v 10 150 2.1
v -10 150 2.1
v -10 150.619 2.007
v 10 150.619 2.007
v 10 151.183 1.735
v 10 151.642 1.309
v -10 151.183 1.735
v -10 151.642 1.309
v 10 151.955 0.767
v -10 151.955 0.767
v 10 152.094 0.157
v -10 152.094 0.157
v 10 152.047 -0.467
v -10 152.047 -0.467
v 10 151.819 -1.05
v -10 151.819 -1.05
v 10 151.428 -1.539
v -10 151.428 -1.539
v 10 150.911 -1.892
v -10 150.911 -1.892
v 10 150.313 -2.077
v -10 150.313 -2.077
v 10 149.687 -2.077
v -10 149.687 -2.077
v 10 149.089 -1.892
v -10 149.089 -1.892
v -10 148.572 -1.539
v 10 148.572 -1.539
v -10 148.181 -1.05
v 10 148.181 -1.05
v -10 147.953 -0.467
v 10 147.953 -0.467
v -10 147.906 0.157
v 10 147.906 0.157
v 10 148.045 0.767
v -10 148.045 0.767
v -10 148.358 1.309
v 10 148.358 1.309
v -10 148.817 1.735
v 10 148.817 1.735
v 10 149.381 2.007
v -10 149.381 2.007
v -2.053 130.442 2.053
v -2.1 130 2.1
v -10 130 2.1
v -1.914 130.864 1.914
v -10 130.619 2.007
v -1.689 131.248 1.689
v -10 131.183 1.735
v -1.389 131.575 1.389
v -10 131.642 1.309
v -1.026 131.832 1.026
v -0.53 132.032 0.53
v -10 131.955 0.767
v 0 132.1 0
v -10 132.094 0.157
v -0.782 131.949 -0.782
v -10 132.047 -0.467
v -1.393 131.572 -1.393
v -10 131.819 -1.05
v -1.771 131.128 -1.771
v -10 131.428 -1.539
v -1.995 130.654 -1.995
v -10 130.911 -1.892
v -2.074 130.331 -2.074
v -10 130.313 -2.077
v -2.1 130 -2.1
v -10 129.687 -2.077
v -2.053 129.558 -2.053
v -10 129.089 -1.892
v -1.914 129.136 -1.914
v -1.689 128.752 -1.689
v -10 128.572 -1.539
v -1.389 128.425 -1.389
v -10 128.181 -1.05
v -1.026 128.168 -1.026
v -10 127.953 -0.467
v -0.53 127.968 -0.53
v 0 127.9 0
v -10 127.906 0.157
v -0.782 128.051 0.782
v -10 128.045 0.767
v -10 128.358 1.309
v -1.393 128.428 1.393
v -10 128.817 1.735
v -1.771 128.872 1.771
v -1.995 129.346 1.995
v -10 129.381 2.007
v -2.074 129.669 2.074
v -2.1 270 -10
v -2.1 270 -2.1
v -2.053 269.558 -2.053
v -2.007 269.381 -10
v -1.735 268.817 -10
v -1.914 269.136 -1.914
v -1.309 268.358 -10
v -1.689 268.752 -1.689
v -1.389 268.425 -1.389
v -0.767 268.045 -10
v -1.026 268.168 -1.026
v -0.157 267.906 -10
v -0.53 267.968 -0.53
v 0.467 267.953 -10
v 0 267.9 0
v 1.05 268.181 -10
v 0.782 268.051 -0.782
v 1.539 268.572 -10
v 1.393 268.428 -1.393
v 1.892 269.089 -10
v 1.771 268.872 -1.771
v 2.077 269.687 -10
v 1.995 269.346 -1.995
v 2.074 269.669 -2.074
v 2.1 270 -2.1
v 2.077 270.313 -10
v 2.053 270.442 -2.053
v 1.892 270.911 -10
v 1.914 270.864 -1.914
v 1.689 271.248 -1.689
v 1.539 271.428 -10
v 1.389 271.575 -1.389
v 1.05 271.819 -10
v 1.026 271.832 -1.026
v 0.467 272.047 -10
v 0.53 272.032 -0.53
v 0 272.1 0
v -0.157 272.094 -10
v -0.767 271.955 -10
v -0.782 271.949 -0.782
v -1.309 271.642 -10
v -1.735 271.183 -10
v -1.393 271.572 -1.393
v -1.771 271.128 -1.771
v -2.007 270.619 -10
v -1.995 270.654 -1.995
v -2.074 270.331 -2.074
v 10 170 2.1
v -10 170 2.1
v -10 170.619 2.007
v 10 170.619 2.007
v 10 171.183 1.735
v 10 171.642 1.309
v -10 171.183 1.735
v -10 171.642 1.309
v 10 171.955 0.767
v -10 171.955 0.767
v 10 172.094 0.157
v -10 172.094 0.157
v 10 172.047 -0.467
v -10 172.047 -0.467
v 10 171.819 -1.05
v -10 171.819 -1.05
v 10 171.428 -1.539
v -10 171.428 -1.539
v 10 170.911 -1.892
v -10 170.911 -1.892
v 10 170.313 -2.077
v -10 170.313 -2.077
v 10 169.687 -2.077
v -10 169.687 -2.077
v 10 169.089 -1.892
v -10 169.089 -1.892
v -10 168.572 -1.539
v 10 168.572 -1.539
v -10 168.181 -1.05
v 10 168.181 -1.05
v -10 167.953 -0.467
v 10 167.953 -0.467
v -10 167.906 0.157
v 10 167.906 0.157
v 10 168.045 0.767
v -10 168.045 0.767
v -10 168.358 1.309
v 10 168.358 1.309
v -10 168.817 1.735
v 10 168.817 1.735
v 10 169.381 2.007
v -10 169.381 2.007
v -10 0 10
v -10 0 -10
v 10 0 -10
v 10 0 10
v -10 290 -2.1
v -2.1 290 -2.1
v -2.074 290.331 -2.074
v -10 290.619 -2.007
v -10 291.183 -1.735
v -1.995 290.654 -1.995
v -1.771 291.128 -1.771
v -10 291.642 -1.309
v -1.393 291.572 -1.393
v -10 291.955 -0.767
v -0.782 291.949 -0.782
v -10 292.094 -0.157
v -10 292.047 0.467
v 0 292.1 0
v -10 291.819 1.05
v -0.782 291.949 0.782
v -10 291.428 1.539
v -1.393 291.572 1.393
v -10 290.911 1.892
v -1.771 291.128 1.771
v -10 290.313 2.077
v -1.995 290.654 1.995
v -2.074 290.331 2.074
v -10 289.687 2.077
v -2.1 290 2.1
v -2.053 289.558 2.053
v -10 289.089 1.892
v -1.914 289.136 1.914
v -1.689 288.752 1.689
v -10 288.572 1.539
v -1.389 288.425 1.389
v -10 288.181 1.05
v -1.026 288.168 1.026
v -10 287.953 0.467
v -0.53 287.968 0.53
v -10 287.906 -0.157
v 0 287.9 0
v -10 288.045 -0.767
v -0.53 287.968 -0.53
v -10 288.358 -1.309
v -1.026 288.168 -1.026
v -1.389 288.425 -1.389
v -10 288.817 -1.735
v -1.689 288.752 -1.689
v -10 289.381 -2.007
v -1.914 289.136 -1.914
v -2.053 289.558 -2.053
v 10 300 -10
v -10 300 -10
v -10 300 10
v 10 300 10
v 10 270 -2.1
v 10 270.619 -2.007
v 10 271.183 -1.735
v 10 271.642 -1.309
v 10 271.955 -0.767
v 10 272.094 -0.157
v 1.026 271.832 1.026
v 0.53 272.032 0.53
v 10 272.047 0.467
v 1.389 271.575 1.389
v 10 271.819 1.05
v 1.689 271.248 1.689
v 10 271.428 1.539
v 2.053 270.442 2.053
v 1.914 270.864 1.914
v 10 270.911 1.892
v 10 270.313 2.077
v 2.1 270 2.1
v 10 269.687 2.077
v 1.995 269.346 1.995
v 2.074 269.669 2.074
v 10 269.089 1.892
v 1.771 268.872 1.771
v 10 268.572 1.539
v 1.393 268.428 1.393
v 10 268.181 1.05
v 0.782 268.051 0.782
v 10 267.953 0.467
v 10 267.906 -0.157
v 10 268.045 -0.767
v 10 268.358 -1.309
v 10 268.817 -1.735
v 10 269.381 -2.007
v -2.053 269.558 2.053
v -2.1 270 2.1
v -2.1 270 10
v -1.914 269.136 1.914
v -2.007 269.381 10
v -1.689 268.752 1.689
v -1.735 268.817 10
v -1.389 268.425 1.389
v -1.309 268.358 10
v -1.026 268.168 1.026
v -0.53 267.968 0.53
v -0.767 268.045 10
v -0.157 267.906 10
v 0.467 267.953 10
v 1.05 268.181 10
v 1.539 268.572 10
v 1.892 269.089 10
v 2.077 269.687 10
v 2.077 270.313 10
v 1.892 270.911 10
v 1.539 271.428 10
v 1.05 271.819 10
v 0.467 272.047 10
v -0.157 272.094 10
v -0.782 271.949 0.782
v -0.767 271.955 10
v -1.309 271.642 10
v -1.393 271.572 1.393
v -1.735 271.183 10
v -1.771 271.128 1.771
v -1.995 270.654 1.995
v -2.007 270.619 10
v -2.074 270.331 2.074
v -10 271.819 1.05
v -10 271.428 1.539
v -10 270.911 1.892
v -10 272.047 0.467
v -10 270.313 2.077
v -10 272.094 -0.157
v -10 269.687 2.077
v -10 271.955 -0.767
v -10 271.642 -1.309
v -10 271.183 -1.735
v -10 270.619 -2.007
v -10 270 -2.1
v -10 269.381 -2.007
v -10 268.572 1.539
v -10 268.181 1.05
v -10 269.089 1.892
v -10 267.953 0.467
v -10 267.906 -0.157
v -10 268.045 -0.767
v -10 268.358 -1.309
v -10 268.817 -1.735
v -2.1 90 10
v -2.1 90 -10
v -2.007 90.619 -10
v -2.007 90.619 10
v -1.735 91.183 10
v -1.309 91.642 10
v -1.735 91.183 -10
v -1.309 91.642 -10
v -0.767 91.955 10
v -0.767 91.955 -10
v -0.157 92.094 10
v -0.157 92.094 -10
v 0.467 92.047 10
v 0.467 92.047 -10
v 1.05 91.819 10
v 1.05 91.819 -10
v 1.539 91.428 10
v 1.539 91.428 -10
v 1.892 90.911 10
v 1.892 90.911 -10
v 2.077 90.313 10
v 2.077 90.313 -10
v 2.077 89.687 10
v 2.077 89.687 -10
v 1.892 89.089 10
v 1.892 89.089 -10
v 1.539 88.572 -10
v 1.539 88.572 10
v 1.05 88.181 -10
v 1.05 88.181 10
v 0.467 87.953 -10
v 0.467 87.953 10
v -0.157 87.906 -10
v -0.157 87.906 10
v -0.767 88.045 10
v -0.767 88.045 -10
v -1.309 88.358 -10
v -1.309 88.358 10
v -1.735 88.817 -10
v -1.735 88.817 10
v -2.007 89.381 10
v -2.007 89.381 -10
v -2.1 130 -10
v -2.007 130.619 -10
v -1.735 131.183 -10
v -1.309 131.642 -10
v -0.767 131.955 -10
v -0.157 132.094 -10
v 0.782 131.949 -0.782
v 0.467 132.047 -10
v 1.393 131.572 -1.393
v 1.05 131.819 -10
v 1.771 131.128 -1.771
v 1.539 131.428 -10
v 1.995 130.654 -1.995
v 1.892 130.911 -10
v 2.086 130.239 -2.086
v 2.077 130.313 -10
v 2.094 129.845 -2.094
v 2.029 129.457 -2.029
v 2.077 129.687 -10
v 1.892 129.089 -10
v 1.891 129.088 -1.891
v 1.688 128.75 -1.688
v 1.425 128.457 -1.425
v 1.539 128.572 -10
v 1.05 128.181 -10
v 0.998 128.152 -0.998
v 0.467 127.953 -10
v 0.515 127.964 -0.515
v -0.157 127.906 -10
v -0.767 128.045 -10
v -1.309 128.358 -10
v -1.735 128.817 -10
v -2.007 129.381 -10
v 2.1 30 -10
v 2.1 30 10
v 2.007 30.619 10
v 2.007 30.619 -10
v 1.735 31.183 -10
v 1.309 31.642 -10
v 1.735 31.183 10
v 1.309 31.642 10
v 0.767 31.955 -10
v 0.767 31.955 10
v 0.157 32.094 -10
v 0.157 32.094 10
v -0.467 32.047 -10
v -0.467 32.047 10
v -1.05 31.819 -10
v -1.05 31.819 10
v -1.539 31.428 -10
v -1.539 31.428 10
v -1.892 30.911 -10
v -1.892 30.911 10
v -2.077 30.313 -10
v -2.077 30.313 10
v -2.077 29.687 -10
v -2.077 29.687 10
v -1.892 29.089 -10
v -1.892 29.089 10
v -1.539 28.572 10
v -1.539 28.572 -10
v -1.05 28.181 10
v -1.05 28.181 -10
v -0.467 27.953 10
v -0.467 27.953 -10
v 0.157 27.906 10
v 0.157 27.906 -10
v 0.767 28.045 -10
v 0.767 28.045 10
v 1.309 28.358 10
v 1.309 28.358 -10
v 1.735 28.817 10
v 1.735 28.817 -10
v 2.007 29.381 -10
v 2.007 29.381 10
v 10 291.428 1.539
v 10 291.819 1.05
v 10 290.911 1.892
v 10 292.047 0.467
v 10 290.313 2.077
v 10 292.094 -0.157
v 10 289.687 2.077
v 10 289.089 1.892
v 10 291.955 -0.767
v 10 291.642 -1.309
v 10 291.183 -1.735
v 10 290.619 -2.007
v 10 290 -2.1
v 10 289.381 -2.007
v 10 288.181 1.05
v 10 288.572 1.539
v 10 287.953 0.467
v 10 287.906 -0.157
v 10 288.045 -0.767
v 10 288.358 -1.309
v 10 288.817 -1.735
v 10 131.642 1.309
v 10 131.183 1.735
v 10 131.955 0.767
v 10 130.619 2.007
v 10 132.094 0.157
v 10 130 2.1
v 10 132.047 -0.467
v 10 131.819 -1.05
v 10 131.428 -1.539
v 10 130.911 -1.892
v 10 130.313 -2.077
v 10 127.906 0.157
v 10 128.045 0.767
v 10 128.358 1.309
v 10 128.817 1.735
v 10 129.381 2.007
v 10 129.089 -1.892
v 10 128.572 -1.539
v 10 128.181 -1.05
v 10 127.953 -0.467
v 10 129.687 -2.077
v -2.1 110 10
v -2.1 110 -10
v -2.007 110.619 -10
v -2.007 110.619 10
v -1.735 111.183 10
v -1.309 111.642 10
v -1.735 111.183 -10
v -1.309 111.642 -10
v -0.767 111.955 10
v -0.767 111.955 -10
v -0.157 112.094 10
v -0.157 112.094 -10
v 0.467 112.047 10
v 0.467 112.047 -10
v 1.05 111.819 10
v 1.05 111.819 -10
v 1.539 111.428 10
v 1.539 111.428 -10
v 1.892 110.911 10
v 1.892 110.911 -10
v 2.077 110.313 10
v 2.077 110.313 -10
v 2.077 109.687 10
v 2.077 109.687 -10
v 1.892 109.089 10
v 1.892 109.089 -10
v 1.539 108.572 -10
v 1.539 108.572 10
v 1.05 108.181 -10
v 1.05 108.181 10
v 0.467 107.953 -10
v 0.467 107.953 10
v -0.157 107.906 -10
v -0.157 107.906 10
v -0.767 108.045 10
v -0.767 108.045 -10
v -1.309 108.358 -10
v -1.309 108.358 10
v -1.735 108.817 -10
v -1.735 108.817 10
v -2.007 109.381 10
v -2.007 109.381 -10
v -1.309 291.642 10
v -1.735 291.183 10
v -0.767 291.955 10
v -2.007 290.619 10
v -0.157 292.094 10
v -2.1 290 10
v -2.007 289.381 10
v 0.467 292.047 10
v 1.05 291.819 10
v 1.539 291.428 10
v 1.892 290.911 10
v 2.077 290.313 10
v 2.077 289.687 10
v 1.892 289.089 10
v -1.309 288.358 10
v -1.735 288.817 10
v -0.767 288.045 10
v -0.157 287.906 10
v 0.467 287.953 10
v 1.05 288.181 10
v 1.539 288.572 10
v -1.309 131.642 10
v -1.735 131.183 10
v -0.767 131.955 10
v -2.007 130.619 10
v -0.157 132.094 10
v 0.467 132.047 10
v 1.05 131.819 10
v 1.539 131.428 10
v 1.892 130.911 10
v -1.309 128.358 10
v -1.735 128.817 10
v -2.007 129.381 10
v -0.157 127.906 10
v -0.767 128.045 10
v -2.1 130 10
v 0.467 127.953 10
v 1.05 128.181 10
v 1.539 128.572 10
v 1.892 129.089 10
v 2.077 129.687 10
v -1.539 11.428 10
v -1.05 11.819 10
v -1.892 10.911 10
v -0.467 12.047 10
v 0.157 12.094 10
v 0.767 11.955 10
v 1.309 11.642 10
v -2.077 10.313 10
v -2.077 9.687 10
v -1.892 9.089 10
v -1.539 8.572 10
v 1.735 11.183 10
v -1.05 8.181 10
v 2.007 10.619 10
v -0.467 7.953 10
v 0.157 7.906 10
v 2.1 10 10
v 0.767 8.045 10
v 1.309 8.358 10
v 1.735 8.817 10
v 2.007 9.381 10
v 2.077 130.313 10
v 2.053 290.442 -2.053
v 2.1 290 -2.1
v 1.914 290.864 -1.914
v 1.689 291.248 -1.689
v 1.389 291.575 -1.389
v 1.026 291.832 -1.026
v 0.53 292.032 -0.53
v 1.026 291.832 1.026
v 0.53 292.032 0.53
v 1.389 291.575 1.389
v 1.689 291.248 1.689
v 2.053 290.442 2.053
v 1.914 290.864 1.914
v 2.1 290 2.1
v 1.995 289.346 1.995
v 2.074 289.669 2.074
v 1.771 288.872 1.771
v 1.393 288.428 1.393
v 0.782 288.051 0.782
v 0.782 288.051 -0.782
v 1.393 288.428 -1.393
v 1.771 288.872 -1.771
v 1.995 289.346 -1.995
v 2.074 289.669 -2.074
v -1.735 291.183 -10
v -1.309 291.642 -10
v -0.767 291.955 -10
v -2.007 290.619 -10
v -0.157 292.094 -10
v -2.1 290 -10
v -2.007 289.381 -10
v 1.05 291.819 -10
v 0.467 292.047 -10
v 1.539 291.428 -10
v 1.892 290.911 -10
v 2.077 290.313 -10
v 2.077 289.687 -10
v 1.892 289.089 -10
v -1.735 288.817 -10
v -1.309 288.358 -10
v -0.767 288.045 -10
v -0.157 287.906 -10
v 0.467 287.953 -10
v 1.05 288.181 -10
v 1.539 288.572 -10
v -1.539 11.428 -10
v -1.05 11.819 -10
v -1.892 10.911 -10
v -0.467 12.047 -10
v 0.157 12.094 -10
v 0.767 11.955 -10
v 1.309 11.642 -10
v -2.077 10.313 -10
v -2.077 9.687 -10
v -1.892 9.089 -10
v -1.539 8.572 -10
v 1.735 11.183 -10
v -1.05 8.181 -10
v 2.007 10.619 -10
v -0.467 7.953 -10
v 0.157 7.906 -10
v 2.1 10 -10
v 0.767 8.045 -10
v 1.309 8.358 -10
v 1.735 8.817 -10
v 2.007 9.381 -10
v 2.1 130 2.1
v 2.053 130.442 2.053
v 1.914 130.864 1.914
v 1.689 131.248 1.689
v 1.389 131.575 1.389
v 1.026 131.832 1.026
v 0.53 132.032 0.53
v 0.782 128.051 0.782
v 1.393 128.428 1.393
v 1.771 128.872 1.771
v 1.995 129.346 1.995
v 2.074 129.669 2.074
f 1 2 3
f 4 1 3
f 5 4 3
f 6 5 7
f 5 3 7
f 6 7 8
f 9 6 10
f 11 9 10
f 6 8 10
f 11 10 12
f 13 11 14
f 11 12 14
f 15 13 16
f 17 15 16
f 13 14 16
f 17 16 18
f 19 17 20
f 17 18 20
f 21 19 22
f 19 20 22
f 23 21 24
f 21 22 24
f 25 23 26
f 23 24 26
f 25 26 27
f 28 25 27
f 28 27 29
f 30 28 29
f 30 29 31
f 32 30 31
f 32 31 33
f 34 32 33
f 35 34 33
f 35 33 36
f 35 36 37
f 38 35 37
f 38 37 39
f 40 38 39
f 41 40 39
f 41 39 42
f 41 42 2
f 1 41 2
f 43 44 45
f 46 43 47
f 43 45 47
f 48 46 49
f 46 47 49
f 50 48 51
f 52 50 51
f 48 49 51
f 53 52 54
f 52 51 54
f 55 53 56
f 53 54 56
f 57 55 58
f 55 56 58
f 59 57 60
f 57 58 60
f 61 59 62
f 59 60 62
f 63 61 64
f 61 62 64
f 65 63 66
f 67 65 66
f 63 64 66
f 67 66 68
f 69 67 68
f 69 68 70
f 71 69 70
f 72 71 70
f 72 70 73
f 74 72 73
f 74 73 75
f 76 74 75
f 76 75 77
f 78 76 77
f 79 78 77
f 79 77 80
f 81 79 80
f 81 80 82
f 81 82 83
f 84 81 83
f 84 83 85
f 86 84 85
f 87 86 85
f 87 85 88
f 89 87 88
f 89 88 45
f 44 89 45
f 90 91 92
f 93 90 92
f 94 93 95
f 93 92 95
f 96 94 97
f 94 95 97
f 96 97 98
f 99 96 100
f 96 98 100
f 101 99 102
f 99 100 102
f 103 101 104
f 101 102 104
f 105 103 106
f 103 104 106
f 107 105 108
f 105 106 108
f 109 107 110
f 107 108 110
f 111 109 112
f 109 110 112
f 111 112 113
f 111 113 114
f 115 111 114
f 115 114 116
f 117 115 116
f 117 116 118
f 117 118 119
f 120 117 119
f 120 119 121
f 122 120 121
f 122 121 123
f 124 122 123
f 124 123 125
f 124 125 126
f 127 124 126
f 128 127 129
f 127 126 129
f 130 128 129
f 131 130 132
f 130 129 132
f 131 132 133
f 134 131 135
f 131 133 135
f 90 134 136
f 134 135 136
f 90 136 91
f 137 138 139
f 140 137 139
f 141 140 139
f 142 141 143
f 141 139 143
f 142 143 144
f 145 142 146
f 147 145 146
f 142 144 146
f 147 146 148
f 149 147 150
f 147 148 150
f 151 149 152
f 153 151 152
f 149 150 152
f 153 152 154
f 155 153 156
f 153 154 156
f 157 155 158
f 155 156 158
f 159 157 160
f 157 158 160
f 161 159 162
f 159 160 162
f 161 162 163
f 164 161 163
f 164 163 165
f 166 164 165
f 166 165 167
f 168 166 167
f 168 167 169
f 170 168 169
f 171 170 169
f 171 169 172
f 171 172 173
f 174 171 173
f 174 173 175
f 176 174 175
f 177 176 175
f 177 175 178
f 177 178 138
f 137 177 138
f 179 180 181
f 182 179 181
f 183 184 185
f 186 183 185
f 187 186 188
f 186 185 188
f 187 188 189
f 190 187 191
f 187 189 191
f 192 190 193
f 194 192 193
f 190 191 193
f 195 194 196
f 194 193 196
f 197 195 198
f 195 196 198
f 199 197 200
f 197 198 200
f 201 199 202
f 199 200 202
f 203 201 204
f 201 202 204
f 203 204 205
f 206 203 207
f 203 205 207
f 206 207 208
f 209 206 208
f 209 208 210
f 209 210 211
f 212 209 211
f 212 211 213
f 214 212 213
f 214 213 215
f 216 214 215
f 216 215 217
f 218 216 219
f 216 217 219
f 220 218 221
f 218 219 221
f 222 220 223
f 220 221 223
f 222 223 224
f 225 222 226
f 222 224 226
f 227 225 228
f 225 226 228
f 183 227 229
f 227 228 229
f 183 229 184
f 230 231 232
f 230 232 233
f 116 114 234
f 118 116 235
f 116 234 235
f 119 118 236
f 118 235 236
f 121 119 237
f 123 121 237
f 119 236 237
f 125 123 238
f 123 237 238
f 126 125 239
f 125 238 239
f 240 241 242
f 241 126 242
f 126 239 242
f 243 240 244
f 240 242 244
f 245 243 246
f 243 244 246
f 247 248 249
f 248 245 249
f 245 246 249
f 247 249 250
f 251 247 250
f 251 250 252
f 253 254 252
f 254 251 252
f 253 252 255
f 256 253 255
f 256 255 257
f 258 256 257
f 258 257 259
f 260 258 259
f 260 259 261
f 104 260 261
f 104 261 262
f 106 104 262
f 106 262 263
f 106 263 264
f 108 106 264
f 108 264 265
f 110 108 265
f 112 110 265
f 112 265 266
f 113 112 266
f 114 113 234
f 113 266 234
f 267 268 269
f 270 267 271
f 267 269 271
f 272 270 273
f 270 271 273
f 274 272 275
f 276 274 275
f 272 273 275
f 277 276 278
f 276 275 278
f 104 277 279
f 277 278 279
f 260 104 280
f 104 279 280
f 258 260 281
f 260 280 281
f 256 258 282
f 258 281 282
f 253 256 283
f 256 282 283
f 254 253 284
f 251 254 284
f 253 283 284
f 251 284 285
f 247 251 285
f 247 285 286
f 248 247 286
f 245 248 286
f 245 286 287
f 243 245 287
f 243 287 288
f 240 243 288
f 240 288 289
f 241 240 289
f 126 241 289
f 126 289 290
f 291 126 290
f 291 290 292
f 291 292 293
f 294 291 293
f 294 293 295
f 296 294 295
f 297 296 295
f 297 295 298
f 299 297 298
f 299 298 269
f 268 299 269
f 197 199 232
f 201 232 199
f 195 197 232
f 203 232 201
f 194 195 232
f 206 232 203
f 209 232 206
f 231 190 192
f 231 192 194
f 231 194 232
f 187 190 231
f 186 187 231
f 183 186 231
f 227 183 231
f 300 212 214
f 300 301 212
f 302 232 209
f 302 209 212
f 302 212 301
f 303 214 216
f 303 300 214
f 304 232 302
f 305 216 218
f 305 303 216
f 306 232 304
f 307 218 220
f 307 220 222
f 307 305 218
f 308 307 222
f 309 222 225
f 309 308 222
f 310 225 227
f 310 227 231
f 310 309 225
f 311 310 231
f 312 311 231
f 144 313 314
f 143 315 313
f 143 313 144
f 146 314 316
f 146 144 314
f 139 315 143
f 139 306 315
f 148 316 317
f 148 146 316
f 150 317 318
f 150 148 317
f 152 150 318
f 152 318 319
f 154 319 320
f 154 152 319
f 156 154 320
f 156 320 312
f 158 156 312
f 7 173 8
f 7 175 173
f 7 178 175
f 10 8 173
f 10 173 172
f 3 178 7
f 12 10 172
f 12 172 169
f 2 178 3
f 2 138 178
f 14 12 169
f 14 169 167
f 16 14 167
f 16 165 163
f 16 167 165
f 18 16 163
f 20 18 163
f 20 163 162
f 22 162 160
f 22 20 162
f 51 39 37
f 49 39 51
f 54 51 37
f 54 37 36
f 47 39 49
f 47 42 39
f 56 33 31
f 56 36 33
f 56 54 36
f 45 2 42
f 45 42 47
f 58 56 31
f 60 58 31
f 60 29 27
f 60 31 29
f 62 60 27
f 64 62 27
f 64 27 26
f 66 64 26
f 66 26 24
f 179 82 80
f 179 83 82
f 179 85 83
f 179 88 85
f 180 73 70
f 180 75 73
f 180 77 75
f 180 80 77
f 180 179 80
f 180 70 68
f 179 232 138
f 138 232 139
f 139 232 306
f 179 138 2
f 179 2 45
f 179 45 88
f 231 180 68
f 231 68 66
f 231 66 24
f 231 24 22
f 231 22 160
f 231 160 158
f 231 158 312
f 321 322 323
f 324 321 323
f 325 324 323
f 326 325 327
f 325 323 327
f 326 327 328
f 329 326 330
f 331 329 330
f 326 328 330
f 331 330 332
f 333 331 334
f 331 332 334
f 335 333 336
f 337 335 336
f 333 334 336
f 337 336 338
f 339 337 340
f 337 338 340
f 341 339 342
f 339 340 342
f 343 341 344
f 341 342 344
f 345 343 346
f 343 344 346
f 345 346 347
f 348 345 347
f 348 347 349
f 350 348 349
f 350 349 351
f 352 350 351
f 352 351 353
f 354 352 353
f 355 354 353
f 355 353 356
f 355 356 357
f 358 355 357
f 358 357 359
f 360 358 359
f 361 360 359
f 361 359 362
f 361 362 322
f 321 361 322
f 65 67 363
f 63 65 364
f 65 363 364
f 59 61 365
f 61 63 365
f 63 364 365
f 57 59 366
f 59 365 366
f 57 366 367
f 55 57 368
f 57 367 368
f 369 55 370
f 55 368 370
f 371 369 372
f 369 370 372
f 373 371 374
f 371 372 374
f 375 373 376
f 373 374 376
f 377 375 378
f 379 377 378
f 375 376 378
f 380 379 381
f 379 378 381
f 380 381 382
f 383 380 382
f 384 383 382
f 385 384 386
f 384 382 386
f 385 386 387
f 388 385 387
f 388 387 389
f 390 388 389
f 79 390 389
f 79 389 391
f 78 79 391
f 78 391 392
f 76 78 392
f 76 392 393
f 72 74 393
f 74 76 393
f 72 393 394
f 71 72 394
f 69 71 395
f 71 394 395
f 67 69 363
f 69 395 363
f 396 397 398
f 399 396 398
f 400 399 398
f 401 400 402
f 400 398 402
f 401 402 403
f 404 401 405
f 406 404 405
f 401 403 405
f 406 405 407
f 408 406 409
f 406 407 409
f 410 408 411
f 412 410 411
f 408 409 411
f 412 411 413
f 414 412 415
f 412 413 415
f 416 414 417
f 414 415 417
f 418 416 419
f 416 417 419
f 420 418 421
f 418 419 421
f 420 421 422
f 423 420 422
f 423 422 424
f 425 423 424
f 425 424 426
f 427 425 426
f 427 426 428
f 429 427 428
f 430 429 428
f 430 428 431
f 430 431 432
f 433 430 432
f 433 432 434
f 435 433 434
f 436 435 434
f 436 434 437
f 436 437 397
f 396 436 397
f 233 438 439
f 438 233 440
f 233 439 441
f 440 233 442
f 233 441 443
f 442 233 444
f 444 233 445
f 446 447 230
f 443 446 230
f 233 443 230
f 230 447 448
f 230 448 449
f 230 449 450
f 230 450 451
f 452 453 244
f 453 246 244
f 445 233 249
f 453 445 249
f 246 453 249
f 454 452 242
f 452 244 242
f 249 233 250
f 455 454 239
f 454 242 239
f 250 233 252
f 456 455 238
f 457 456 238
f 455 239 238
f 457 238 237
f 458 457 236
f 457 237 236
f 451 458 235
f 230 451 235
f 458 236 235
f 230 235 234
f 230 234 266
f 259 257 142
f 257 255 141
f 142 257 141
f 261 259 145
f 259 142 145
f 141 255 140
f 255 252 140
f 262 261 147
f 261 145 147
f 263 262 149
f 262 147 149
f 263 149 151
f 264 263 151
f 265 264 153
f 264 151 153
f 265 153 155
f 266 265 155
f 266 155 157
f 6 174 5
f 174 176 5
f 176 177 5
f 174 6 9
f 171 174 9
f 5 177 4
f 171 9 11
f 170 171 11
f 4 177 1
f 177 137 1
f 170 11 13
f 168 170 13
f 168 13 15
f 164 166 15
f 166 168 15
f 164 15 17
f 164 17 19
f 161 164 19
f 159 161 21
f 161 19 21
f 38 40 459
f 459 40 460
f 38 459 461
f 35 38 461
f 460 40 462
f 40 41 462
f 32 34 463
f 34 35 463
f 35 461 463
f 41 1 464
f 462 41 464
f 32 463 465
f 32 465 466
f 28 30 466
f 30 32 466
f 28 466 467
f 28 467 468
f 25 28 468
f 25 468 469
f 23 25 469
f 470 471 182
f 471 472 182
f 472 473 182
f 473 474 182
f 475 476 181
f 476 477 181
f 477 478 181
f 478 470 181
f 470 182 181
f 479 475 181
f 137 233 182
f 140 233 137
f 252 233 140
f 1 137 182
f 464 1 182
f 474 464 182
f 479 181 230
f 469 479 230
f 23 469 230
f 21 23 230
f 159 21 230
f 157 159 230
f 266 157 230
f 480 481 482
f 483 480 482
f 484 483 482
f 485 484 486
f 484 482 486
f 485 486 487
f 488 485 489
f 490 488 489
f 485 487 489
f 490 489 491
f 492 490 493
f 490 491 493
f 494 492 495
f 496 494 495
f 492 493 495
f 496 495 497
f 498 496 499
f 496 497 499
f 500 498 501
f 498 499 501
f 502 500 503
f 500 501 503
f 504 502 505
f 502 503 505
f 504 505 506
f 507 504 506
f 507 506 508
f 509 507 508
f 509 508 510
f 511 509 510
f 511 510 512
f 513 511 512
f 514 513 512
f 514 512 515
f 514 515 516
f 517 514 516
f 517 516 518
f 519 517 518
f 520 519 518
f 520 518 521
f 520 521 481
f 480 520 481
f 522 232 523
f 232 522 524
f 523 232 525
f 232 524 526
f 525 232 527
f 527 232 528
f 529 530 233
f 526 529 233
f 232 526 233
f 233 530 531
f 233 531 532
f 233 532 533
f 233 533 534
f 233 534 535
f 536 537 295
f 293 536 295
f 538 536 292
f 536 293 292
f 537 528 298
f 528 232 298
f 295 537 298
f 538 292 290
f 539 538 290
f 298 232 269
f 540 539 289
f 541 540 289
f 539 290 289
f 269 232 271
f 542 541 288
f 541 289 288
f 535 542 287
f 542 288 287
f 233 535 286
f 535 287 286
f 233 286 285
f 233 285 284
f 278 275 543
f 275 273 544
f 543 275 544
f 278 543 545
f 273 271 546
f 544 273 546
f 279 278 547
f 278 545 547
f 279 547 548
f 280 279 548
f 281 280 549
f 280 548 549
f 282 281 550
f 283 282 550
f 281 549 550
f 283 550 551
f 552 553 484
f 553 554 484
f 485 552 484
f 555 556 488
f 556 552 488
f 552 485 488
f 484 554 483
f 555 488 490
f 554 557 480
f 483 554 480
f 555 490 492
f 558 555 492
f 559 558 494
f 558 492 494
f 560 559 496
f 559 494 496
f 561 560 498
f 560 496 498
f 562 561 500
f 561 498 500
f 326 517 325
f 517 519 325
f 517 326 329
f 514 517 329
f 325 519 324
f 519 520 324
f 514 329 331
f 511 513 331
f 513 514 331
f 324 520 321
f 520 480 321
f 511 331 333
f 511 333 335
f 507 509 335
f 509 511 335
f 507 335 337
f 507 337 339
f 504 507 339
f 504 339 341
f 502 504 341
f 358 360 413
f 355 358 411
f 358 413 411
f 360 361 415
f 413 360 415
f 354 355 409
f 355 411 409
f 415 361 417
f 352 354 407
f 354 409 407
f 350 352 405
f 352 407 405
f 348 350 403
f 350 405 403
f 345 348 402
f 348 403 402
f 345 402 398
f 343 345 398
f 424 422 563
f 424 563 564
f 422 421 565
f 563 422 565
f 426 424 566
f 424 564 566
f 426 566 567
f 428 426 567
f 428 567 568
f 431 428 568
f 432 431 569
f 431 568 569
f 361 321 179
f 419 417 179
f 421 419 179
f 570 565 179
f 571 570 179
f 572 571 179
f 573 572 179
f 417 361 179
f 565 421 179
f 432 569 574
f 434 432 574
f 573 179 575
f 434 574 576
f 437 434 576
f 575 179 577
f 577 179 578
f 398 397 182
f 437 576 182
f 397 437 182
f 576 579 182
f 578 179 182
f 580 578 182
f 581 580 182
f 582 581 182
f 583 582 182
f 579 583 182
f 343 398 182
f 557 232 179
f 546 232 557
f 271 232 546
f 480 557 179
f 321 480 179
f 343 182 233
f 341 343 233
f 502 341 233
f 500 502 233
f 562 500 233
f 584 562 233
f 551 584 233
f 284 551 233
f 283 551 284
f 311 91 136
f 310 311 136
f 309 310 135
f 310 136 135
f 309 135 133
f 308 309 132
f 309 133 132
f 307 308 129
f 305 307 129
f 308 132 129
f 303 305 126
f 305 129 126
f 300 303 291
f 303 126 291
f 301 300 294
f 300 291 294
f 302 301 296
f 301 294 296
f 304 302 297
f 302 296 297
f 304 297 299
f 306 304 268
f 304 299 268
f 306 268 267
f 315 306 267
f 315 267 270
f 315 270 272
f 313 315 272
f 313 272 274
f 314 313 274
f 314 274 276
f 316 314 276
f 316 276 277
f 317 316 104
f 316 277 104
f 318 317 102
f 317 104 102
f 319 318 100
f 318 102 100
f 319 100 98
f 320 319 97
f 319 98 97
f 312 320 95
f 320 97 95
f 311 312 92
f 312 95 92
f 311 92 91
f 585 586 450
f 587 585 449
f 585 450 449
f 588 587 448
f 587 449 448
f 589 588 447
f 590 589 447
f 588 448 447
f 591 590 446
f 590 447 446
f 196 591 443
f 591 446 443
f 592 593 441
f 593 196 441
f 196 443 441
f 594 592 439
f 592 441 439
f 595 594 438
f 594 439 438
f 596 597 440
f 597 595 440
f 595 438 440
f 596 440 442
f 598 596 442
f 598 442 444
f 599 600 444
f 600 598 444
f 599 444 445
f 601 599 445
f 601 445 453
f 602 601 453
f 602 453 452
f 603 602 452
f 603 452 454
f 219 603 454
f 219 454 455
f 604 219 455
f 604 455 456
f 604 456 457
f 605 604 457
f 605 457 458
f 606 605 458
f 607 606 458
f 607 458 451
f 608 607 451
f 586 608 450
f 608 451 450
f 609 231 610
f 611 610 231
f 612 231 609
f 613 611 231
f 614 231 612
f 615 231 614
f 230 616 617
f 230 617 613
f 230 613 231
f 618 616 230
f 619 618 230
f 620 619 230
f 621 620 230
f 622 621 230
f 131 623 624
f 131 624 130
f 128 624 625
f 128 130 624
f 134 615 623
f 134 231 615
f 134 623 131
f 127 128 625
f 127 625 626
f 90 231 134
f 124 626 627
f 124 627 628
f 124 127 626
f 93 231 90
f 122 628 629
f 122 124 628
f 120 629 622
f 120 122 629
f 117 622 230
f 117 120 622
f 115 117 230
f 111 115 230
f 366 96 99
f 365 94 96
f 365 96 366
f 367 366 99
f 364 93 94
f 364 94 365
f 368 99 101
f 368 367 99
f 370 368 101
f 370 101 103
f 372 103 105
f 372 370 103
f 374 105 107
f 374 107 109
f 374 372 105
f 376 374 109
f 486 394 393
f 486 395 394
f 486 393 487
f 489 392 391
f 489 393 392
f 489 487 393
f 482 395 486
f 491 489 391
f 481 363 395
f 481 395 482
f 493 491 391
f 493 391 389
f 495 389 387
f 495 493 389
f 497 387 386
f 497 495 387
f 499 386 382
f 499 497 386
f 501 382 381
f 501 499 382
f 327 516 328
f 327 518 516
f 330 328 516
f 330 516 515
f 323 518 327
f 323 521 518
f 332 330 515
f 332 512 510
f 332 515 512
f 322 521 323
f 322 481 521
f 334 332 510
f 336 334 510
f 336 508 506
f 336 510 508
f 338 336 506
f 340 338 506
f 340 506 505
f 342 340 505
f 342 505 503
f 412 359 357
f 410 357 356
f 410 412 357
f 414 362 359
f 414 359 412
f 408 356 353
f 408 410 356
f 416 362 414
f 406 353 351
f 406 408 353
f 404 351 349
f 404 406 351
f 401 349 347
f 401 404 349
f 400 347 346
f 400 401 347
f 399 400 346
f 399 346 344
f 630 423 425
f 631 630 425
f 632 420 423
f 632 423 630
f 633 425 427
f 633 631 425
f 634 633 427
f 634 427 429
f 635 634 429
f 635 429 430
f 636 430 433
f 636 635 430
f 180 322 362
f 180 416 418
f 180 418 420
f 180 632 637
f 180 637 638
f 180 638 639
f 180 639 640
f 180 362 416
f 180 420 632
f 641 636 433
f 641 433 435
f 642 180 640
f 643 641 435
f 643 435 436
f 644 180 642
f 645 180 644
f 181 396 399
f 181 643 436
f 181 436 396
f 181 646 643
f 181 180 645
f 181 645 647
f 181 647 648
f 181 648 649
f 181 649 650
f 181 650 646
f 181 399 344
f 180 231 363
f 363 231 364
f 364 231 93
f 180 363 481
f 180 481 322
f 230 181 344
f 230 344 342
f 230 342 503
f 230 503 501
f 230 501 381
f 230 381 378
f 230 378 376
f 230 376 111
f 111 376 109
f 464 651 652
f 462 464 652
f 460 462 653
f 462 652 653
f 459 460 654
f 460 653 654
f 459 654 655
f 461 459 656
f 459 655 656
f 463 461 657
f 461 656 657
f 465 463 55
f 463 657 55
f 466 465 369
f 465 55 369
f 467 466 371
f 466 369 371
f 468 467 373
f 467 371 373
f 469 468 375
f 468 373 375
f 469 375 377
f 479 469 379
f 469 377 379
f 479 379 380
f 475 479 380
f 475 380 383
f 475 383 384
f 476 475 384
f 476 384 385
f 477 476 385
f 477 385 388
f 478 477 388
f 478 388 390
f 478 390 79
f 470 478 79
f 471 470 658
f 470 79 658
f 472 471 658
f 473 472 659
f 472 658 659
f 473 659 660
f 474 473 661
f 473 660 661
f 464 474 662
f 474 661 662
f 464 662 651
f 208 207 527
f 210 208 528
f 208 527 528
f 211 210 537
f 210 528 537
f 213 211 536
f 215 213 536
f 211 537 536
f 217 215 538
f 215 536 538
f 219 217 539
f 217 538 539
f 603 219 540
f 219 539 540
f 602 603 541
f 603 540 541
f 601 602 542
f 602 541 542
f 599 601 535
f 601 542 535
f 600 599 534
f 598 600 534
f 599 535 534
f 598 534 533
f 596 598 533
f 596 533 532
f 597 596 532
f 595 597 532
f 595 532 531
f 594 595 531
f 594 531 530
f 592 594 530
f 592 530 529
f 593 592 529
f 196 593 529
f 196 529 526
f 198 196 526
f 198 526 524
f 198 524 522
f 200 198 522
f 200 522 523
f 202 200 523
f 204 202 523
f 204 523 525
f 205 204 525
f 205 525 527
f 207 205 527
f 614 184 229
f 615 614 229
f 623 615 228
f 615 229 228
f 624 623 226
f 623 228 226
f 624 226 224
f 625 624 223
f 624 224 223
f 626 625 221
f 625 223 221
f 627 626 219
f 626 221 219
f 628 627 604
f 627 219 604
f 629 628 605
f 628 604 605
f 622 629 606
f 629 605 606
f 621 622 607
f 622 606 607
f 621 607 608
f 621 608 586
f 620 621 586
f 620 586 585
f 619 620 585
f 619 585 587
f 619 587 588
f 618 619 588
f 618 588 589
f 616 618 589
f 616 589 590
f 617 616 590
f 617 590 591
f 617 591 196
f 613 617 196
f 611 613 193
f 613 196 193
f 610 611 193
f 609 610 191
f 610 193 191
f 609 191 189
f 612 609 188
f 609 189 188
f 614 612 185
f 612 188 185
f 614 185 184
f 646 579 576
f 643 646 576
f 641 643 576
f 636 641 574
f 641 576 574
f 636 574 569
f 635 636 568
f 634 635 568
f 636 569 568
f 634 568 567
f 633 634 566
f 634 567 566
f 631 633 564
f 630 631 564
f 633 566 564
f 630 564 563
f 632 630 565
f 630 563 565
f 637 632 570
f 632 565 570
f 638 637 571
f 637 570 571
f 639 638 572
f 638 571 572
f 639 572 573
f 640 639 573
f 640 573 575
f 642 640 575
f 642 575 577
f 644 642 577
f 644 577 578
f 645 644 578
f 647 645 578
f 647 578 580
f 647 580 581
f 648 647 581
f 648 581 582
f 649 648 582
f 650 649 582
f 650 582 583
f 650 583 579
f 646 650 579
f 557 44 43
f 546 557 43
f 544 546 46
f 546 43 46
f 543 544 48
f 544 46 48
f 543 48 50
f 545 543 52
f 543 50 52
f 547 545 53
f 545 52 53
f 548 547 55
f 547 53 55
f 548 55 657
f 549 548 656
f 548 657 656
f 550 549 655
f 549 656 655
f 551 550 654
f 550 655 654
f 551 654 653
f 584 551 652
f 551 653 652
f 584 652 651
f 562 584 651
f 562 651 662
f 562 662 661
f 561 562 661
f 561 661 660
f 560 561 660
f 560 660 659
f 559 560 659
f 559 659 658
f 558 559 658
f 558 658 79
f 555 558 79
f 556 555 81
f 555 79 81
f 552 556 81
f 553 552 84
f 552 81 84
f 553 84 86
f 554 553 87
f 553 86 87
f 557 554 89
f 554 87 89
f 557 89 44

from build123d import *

# Parameters (mm, degrees)
SKETCH_1_W          = 20
SKETCH_1_H          = 20
EXTRUDE_1_DEPTH     = 300
SKETCH_2_R          = 2.1
CUT_EXTRUDE_1_DEPTH = 301.83217913
SKETCH_4_R          = 2.1
CUT_EXTRUDE_2_DEPTH = 301.83217913
SKETCH_5_R          = 2.1
CUT_EXTRUDE_3_DEPTH = 301.83217913
SKETCH_6_R          = 2.1
CUT_EXTRUDE_4_DEPTH = 301.83217913


with BuildPart() as part:
    # 草图1 → 凸台-拉伸1 (new body)
    with BuildSketch(Plane(origin=(0, 0, 0), x_dir=(1, 0, 0), z_dir=(0, 1, 0))):
        Rectangle(SKETCH_1_W, SKETCH_1_H)
    extrude(amount=EXTRUDE_1_DEPTH)

    # 草图2 → 切除-拉伸1 (cut, through all)
    with BuildSketch(Plane.XY.offset(10)):
        with Locations((0, 10)):
            Circle(SKETCH_2_R)
        with Locations((0, 30)):
            Circle(SKETCH_2_R)
        with Locations(Location((0, 270, 0), (0, 0, 180))):
            Circle(SKETCH_2_R)
        with Locations(Location((0, 290, 0), (0, 0, 180))):
            Circle(SKETCH_2_R)
    extrude(amount=-CUT_EXTRUDE_1_DEPTH, mode=Mode.SUBTRACT)

    # 草图4 → 切除-拉伸2 (cut, through all)
    with BuildSketch(Plane.ZY.offset(10)):
        with Locations((0, 130)):
            Circle(SKETCH_4_R)
        with Locations((0, 150)):
            Circle(SKETCH_4_R)
        with Locations((0, 170)):
            Circle(SKETCH_4_R)
    extrude(amount=-CUT_EXTRUDE_2_DEPTH, mode=Mode.SUBTRACT)

    # 草图5 → 切除-拉伸3 (cut, through all)
    with BuildSketch(Plane(origin=(10, 0, 0), x_dir=(0, 0, -1), z_dir=(1, 0, 0))):
        with Locations((0, 290)):
            Circle(SKETCH_5_R)
        with Locations((0, 270)):
            Circle(SKETCH_5_R)
    extrude(amount=-CUT_EXTRUDE_3_DEPTH, mode=Mode.SUBTRACT)

    # 草图6 → 切除-拉伸4 (cut, through all)
    with BuildSketch(Plane(origin=(0, 0, -10), x_dir=(-1, 0, 0), z_dir=(0, 0, -1))):
        with Locations((0, 90)):
            Circle(SKETCH_6_R)
        with Locations((0, 110)):
            Circle(SKETCH_6_R)
        with Locations((0, 130)):
            Circle(SKETCH_6_R)
    extrude(amount=-CUT_EXTRUDE_4_DEPTH, mode=Mode.SUBTRACT)


solid = part.part
